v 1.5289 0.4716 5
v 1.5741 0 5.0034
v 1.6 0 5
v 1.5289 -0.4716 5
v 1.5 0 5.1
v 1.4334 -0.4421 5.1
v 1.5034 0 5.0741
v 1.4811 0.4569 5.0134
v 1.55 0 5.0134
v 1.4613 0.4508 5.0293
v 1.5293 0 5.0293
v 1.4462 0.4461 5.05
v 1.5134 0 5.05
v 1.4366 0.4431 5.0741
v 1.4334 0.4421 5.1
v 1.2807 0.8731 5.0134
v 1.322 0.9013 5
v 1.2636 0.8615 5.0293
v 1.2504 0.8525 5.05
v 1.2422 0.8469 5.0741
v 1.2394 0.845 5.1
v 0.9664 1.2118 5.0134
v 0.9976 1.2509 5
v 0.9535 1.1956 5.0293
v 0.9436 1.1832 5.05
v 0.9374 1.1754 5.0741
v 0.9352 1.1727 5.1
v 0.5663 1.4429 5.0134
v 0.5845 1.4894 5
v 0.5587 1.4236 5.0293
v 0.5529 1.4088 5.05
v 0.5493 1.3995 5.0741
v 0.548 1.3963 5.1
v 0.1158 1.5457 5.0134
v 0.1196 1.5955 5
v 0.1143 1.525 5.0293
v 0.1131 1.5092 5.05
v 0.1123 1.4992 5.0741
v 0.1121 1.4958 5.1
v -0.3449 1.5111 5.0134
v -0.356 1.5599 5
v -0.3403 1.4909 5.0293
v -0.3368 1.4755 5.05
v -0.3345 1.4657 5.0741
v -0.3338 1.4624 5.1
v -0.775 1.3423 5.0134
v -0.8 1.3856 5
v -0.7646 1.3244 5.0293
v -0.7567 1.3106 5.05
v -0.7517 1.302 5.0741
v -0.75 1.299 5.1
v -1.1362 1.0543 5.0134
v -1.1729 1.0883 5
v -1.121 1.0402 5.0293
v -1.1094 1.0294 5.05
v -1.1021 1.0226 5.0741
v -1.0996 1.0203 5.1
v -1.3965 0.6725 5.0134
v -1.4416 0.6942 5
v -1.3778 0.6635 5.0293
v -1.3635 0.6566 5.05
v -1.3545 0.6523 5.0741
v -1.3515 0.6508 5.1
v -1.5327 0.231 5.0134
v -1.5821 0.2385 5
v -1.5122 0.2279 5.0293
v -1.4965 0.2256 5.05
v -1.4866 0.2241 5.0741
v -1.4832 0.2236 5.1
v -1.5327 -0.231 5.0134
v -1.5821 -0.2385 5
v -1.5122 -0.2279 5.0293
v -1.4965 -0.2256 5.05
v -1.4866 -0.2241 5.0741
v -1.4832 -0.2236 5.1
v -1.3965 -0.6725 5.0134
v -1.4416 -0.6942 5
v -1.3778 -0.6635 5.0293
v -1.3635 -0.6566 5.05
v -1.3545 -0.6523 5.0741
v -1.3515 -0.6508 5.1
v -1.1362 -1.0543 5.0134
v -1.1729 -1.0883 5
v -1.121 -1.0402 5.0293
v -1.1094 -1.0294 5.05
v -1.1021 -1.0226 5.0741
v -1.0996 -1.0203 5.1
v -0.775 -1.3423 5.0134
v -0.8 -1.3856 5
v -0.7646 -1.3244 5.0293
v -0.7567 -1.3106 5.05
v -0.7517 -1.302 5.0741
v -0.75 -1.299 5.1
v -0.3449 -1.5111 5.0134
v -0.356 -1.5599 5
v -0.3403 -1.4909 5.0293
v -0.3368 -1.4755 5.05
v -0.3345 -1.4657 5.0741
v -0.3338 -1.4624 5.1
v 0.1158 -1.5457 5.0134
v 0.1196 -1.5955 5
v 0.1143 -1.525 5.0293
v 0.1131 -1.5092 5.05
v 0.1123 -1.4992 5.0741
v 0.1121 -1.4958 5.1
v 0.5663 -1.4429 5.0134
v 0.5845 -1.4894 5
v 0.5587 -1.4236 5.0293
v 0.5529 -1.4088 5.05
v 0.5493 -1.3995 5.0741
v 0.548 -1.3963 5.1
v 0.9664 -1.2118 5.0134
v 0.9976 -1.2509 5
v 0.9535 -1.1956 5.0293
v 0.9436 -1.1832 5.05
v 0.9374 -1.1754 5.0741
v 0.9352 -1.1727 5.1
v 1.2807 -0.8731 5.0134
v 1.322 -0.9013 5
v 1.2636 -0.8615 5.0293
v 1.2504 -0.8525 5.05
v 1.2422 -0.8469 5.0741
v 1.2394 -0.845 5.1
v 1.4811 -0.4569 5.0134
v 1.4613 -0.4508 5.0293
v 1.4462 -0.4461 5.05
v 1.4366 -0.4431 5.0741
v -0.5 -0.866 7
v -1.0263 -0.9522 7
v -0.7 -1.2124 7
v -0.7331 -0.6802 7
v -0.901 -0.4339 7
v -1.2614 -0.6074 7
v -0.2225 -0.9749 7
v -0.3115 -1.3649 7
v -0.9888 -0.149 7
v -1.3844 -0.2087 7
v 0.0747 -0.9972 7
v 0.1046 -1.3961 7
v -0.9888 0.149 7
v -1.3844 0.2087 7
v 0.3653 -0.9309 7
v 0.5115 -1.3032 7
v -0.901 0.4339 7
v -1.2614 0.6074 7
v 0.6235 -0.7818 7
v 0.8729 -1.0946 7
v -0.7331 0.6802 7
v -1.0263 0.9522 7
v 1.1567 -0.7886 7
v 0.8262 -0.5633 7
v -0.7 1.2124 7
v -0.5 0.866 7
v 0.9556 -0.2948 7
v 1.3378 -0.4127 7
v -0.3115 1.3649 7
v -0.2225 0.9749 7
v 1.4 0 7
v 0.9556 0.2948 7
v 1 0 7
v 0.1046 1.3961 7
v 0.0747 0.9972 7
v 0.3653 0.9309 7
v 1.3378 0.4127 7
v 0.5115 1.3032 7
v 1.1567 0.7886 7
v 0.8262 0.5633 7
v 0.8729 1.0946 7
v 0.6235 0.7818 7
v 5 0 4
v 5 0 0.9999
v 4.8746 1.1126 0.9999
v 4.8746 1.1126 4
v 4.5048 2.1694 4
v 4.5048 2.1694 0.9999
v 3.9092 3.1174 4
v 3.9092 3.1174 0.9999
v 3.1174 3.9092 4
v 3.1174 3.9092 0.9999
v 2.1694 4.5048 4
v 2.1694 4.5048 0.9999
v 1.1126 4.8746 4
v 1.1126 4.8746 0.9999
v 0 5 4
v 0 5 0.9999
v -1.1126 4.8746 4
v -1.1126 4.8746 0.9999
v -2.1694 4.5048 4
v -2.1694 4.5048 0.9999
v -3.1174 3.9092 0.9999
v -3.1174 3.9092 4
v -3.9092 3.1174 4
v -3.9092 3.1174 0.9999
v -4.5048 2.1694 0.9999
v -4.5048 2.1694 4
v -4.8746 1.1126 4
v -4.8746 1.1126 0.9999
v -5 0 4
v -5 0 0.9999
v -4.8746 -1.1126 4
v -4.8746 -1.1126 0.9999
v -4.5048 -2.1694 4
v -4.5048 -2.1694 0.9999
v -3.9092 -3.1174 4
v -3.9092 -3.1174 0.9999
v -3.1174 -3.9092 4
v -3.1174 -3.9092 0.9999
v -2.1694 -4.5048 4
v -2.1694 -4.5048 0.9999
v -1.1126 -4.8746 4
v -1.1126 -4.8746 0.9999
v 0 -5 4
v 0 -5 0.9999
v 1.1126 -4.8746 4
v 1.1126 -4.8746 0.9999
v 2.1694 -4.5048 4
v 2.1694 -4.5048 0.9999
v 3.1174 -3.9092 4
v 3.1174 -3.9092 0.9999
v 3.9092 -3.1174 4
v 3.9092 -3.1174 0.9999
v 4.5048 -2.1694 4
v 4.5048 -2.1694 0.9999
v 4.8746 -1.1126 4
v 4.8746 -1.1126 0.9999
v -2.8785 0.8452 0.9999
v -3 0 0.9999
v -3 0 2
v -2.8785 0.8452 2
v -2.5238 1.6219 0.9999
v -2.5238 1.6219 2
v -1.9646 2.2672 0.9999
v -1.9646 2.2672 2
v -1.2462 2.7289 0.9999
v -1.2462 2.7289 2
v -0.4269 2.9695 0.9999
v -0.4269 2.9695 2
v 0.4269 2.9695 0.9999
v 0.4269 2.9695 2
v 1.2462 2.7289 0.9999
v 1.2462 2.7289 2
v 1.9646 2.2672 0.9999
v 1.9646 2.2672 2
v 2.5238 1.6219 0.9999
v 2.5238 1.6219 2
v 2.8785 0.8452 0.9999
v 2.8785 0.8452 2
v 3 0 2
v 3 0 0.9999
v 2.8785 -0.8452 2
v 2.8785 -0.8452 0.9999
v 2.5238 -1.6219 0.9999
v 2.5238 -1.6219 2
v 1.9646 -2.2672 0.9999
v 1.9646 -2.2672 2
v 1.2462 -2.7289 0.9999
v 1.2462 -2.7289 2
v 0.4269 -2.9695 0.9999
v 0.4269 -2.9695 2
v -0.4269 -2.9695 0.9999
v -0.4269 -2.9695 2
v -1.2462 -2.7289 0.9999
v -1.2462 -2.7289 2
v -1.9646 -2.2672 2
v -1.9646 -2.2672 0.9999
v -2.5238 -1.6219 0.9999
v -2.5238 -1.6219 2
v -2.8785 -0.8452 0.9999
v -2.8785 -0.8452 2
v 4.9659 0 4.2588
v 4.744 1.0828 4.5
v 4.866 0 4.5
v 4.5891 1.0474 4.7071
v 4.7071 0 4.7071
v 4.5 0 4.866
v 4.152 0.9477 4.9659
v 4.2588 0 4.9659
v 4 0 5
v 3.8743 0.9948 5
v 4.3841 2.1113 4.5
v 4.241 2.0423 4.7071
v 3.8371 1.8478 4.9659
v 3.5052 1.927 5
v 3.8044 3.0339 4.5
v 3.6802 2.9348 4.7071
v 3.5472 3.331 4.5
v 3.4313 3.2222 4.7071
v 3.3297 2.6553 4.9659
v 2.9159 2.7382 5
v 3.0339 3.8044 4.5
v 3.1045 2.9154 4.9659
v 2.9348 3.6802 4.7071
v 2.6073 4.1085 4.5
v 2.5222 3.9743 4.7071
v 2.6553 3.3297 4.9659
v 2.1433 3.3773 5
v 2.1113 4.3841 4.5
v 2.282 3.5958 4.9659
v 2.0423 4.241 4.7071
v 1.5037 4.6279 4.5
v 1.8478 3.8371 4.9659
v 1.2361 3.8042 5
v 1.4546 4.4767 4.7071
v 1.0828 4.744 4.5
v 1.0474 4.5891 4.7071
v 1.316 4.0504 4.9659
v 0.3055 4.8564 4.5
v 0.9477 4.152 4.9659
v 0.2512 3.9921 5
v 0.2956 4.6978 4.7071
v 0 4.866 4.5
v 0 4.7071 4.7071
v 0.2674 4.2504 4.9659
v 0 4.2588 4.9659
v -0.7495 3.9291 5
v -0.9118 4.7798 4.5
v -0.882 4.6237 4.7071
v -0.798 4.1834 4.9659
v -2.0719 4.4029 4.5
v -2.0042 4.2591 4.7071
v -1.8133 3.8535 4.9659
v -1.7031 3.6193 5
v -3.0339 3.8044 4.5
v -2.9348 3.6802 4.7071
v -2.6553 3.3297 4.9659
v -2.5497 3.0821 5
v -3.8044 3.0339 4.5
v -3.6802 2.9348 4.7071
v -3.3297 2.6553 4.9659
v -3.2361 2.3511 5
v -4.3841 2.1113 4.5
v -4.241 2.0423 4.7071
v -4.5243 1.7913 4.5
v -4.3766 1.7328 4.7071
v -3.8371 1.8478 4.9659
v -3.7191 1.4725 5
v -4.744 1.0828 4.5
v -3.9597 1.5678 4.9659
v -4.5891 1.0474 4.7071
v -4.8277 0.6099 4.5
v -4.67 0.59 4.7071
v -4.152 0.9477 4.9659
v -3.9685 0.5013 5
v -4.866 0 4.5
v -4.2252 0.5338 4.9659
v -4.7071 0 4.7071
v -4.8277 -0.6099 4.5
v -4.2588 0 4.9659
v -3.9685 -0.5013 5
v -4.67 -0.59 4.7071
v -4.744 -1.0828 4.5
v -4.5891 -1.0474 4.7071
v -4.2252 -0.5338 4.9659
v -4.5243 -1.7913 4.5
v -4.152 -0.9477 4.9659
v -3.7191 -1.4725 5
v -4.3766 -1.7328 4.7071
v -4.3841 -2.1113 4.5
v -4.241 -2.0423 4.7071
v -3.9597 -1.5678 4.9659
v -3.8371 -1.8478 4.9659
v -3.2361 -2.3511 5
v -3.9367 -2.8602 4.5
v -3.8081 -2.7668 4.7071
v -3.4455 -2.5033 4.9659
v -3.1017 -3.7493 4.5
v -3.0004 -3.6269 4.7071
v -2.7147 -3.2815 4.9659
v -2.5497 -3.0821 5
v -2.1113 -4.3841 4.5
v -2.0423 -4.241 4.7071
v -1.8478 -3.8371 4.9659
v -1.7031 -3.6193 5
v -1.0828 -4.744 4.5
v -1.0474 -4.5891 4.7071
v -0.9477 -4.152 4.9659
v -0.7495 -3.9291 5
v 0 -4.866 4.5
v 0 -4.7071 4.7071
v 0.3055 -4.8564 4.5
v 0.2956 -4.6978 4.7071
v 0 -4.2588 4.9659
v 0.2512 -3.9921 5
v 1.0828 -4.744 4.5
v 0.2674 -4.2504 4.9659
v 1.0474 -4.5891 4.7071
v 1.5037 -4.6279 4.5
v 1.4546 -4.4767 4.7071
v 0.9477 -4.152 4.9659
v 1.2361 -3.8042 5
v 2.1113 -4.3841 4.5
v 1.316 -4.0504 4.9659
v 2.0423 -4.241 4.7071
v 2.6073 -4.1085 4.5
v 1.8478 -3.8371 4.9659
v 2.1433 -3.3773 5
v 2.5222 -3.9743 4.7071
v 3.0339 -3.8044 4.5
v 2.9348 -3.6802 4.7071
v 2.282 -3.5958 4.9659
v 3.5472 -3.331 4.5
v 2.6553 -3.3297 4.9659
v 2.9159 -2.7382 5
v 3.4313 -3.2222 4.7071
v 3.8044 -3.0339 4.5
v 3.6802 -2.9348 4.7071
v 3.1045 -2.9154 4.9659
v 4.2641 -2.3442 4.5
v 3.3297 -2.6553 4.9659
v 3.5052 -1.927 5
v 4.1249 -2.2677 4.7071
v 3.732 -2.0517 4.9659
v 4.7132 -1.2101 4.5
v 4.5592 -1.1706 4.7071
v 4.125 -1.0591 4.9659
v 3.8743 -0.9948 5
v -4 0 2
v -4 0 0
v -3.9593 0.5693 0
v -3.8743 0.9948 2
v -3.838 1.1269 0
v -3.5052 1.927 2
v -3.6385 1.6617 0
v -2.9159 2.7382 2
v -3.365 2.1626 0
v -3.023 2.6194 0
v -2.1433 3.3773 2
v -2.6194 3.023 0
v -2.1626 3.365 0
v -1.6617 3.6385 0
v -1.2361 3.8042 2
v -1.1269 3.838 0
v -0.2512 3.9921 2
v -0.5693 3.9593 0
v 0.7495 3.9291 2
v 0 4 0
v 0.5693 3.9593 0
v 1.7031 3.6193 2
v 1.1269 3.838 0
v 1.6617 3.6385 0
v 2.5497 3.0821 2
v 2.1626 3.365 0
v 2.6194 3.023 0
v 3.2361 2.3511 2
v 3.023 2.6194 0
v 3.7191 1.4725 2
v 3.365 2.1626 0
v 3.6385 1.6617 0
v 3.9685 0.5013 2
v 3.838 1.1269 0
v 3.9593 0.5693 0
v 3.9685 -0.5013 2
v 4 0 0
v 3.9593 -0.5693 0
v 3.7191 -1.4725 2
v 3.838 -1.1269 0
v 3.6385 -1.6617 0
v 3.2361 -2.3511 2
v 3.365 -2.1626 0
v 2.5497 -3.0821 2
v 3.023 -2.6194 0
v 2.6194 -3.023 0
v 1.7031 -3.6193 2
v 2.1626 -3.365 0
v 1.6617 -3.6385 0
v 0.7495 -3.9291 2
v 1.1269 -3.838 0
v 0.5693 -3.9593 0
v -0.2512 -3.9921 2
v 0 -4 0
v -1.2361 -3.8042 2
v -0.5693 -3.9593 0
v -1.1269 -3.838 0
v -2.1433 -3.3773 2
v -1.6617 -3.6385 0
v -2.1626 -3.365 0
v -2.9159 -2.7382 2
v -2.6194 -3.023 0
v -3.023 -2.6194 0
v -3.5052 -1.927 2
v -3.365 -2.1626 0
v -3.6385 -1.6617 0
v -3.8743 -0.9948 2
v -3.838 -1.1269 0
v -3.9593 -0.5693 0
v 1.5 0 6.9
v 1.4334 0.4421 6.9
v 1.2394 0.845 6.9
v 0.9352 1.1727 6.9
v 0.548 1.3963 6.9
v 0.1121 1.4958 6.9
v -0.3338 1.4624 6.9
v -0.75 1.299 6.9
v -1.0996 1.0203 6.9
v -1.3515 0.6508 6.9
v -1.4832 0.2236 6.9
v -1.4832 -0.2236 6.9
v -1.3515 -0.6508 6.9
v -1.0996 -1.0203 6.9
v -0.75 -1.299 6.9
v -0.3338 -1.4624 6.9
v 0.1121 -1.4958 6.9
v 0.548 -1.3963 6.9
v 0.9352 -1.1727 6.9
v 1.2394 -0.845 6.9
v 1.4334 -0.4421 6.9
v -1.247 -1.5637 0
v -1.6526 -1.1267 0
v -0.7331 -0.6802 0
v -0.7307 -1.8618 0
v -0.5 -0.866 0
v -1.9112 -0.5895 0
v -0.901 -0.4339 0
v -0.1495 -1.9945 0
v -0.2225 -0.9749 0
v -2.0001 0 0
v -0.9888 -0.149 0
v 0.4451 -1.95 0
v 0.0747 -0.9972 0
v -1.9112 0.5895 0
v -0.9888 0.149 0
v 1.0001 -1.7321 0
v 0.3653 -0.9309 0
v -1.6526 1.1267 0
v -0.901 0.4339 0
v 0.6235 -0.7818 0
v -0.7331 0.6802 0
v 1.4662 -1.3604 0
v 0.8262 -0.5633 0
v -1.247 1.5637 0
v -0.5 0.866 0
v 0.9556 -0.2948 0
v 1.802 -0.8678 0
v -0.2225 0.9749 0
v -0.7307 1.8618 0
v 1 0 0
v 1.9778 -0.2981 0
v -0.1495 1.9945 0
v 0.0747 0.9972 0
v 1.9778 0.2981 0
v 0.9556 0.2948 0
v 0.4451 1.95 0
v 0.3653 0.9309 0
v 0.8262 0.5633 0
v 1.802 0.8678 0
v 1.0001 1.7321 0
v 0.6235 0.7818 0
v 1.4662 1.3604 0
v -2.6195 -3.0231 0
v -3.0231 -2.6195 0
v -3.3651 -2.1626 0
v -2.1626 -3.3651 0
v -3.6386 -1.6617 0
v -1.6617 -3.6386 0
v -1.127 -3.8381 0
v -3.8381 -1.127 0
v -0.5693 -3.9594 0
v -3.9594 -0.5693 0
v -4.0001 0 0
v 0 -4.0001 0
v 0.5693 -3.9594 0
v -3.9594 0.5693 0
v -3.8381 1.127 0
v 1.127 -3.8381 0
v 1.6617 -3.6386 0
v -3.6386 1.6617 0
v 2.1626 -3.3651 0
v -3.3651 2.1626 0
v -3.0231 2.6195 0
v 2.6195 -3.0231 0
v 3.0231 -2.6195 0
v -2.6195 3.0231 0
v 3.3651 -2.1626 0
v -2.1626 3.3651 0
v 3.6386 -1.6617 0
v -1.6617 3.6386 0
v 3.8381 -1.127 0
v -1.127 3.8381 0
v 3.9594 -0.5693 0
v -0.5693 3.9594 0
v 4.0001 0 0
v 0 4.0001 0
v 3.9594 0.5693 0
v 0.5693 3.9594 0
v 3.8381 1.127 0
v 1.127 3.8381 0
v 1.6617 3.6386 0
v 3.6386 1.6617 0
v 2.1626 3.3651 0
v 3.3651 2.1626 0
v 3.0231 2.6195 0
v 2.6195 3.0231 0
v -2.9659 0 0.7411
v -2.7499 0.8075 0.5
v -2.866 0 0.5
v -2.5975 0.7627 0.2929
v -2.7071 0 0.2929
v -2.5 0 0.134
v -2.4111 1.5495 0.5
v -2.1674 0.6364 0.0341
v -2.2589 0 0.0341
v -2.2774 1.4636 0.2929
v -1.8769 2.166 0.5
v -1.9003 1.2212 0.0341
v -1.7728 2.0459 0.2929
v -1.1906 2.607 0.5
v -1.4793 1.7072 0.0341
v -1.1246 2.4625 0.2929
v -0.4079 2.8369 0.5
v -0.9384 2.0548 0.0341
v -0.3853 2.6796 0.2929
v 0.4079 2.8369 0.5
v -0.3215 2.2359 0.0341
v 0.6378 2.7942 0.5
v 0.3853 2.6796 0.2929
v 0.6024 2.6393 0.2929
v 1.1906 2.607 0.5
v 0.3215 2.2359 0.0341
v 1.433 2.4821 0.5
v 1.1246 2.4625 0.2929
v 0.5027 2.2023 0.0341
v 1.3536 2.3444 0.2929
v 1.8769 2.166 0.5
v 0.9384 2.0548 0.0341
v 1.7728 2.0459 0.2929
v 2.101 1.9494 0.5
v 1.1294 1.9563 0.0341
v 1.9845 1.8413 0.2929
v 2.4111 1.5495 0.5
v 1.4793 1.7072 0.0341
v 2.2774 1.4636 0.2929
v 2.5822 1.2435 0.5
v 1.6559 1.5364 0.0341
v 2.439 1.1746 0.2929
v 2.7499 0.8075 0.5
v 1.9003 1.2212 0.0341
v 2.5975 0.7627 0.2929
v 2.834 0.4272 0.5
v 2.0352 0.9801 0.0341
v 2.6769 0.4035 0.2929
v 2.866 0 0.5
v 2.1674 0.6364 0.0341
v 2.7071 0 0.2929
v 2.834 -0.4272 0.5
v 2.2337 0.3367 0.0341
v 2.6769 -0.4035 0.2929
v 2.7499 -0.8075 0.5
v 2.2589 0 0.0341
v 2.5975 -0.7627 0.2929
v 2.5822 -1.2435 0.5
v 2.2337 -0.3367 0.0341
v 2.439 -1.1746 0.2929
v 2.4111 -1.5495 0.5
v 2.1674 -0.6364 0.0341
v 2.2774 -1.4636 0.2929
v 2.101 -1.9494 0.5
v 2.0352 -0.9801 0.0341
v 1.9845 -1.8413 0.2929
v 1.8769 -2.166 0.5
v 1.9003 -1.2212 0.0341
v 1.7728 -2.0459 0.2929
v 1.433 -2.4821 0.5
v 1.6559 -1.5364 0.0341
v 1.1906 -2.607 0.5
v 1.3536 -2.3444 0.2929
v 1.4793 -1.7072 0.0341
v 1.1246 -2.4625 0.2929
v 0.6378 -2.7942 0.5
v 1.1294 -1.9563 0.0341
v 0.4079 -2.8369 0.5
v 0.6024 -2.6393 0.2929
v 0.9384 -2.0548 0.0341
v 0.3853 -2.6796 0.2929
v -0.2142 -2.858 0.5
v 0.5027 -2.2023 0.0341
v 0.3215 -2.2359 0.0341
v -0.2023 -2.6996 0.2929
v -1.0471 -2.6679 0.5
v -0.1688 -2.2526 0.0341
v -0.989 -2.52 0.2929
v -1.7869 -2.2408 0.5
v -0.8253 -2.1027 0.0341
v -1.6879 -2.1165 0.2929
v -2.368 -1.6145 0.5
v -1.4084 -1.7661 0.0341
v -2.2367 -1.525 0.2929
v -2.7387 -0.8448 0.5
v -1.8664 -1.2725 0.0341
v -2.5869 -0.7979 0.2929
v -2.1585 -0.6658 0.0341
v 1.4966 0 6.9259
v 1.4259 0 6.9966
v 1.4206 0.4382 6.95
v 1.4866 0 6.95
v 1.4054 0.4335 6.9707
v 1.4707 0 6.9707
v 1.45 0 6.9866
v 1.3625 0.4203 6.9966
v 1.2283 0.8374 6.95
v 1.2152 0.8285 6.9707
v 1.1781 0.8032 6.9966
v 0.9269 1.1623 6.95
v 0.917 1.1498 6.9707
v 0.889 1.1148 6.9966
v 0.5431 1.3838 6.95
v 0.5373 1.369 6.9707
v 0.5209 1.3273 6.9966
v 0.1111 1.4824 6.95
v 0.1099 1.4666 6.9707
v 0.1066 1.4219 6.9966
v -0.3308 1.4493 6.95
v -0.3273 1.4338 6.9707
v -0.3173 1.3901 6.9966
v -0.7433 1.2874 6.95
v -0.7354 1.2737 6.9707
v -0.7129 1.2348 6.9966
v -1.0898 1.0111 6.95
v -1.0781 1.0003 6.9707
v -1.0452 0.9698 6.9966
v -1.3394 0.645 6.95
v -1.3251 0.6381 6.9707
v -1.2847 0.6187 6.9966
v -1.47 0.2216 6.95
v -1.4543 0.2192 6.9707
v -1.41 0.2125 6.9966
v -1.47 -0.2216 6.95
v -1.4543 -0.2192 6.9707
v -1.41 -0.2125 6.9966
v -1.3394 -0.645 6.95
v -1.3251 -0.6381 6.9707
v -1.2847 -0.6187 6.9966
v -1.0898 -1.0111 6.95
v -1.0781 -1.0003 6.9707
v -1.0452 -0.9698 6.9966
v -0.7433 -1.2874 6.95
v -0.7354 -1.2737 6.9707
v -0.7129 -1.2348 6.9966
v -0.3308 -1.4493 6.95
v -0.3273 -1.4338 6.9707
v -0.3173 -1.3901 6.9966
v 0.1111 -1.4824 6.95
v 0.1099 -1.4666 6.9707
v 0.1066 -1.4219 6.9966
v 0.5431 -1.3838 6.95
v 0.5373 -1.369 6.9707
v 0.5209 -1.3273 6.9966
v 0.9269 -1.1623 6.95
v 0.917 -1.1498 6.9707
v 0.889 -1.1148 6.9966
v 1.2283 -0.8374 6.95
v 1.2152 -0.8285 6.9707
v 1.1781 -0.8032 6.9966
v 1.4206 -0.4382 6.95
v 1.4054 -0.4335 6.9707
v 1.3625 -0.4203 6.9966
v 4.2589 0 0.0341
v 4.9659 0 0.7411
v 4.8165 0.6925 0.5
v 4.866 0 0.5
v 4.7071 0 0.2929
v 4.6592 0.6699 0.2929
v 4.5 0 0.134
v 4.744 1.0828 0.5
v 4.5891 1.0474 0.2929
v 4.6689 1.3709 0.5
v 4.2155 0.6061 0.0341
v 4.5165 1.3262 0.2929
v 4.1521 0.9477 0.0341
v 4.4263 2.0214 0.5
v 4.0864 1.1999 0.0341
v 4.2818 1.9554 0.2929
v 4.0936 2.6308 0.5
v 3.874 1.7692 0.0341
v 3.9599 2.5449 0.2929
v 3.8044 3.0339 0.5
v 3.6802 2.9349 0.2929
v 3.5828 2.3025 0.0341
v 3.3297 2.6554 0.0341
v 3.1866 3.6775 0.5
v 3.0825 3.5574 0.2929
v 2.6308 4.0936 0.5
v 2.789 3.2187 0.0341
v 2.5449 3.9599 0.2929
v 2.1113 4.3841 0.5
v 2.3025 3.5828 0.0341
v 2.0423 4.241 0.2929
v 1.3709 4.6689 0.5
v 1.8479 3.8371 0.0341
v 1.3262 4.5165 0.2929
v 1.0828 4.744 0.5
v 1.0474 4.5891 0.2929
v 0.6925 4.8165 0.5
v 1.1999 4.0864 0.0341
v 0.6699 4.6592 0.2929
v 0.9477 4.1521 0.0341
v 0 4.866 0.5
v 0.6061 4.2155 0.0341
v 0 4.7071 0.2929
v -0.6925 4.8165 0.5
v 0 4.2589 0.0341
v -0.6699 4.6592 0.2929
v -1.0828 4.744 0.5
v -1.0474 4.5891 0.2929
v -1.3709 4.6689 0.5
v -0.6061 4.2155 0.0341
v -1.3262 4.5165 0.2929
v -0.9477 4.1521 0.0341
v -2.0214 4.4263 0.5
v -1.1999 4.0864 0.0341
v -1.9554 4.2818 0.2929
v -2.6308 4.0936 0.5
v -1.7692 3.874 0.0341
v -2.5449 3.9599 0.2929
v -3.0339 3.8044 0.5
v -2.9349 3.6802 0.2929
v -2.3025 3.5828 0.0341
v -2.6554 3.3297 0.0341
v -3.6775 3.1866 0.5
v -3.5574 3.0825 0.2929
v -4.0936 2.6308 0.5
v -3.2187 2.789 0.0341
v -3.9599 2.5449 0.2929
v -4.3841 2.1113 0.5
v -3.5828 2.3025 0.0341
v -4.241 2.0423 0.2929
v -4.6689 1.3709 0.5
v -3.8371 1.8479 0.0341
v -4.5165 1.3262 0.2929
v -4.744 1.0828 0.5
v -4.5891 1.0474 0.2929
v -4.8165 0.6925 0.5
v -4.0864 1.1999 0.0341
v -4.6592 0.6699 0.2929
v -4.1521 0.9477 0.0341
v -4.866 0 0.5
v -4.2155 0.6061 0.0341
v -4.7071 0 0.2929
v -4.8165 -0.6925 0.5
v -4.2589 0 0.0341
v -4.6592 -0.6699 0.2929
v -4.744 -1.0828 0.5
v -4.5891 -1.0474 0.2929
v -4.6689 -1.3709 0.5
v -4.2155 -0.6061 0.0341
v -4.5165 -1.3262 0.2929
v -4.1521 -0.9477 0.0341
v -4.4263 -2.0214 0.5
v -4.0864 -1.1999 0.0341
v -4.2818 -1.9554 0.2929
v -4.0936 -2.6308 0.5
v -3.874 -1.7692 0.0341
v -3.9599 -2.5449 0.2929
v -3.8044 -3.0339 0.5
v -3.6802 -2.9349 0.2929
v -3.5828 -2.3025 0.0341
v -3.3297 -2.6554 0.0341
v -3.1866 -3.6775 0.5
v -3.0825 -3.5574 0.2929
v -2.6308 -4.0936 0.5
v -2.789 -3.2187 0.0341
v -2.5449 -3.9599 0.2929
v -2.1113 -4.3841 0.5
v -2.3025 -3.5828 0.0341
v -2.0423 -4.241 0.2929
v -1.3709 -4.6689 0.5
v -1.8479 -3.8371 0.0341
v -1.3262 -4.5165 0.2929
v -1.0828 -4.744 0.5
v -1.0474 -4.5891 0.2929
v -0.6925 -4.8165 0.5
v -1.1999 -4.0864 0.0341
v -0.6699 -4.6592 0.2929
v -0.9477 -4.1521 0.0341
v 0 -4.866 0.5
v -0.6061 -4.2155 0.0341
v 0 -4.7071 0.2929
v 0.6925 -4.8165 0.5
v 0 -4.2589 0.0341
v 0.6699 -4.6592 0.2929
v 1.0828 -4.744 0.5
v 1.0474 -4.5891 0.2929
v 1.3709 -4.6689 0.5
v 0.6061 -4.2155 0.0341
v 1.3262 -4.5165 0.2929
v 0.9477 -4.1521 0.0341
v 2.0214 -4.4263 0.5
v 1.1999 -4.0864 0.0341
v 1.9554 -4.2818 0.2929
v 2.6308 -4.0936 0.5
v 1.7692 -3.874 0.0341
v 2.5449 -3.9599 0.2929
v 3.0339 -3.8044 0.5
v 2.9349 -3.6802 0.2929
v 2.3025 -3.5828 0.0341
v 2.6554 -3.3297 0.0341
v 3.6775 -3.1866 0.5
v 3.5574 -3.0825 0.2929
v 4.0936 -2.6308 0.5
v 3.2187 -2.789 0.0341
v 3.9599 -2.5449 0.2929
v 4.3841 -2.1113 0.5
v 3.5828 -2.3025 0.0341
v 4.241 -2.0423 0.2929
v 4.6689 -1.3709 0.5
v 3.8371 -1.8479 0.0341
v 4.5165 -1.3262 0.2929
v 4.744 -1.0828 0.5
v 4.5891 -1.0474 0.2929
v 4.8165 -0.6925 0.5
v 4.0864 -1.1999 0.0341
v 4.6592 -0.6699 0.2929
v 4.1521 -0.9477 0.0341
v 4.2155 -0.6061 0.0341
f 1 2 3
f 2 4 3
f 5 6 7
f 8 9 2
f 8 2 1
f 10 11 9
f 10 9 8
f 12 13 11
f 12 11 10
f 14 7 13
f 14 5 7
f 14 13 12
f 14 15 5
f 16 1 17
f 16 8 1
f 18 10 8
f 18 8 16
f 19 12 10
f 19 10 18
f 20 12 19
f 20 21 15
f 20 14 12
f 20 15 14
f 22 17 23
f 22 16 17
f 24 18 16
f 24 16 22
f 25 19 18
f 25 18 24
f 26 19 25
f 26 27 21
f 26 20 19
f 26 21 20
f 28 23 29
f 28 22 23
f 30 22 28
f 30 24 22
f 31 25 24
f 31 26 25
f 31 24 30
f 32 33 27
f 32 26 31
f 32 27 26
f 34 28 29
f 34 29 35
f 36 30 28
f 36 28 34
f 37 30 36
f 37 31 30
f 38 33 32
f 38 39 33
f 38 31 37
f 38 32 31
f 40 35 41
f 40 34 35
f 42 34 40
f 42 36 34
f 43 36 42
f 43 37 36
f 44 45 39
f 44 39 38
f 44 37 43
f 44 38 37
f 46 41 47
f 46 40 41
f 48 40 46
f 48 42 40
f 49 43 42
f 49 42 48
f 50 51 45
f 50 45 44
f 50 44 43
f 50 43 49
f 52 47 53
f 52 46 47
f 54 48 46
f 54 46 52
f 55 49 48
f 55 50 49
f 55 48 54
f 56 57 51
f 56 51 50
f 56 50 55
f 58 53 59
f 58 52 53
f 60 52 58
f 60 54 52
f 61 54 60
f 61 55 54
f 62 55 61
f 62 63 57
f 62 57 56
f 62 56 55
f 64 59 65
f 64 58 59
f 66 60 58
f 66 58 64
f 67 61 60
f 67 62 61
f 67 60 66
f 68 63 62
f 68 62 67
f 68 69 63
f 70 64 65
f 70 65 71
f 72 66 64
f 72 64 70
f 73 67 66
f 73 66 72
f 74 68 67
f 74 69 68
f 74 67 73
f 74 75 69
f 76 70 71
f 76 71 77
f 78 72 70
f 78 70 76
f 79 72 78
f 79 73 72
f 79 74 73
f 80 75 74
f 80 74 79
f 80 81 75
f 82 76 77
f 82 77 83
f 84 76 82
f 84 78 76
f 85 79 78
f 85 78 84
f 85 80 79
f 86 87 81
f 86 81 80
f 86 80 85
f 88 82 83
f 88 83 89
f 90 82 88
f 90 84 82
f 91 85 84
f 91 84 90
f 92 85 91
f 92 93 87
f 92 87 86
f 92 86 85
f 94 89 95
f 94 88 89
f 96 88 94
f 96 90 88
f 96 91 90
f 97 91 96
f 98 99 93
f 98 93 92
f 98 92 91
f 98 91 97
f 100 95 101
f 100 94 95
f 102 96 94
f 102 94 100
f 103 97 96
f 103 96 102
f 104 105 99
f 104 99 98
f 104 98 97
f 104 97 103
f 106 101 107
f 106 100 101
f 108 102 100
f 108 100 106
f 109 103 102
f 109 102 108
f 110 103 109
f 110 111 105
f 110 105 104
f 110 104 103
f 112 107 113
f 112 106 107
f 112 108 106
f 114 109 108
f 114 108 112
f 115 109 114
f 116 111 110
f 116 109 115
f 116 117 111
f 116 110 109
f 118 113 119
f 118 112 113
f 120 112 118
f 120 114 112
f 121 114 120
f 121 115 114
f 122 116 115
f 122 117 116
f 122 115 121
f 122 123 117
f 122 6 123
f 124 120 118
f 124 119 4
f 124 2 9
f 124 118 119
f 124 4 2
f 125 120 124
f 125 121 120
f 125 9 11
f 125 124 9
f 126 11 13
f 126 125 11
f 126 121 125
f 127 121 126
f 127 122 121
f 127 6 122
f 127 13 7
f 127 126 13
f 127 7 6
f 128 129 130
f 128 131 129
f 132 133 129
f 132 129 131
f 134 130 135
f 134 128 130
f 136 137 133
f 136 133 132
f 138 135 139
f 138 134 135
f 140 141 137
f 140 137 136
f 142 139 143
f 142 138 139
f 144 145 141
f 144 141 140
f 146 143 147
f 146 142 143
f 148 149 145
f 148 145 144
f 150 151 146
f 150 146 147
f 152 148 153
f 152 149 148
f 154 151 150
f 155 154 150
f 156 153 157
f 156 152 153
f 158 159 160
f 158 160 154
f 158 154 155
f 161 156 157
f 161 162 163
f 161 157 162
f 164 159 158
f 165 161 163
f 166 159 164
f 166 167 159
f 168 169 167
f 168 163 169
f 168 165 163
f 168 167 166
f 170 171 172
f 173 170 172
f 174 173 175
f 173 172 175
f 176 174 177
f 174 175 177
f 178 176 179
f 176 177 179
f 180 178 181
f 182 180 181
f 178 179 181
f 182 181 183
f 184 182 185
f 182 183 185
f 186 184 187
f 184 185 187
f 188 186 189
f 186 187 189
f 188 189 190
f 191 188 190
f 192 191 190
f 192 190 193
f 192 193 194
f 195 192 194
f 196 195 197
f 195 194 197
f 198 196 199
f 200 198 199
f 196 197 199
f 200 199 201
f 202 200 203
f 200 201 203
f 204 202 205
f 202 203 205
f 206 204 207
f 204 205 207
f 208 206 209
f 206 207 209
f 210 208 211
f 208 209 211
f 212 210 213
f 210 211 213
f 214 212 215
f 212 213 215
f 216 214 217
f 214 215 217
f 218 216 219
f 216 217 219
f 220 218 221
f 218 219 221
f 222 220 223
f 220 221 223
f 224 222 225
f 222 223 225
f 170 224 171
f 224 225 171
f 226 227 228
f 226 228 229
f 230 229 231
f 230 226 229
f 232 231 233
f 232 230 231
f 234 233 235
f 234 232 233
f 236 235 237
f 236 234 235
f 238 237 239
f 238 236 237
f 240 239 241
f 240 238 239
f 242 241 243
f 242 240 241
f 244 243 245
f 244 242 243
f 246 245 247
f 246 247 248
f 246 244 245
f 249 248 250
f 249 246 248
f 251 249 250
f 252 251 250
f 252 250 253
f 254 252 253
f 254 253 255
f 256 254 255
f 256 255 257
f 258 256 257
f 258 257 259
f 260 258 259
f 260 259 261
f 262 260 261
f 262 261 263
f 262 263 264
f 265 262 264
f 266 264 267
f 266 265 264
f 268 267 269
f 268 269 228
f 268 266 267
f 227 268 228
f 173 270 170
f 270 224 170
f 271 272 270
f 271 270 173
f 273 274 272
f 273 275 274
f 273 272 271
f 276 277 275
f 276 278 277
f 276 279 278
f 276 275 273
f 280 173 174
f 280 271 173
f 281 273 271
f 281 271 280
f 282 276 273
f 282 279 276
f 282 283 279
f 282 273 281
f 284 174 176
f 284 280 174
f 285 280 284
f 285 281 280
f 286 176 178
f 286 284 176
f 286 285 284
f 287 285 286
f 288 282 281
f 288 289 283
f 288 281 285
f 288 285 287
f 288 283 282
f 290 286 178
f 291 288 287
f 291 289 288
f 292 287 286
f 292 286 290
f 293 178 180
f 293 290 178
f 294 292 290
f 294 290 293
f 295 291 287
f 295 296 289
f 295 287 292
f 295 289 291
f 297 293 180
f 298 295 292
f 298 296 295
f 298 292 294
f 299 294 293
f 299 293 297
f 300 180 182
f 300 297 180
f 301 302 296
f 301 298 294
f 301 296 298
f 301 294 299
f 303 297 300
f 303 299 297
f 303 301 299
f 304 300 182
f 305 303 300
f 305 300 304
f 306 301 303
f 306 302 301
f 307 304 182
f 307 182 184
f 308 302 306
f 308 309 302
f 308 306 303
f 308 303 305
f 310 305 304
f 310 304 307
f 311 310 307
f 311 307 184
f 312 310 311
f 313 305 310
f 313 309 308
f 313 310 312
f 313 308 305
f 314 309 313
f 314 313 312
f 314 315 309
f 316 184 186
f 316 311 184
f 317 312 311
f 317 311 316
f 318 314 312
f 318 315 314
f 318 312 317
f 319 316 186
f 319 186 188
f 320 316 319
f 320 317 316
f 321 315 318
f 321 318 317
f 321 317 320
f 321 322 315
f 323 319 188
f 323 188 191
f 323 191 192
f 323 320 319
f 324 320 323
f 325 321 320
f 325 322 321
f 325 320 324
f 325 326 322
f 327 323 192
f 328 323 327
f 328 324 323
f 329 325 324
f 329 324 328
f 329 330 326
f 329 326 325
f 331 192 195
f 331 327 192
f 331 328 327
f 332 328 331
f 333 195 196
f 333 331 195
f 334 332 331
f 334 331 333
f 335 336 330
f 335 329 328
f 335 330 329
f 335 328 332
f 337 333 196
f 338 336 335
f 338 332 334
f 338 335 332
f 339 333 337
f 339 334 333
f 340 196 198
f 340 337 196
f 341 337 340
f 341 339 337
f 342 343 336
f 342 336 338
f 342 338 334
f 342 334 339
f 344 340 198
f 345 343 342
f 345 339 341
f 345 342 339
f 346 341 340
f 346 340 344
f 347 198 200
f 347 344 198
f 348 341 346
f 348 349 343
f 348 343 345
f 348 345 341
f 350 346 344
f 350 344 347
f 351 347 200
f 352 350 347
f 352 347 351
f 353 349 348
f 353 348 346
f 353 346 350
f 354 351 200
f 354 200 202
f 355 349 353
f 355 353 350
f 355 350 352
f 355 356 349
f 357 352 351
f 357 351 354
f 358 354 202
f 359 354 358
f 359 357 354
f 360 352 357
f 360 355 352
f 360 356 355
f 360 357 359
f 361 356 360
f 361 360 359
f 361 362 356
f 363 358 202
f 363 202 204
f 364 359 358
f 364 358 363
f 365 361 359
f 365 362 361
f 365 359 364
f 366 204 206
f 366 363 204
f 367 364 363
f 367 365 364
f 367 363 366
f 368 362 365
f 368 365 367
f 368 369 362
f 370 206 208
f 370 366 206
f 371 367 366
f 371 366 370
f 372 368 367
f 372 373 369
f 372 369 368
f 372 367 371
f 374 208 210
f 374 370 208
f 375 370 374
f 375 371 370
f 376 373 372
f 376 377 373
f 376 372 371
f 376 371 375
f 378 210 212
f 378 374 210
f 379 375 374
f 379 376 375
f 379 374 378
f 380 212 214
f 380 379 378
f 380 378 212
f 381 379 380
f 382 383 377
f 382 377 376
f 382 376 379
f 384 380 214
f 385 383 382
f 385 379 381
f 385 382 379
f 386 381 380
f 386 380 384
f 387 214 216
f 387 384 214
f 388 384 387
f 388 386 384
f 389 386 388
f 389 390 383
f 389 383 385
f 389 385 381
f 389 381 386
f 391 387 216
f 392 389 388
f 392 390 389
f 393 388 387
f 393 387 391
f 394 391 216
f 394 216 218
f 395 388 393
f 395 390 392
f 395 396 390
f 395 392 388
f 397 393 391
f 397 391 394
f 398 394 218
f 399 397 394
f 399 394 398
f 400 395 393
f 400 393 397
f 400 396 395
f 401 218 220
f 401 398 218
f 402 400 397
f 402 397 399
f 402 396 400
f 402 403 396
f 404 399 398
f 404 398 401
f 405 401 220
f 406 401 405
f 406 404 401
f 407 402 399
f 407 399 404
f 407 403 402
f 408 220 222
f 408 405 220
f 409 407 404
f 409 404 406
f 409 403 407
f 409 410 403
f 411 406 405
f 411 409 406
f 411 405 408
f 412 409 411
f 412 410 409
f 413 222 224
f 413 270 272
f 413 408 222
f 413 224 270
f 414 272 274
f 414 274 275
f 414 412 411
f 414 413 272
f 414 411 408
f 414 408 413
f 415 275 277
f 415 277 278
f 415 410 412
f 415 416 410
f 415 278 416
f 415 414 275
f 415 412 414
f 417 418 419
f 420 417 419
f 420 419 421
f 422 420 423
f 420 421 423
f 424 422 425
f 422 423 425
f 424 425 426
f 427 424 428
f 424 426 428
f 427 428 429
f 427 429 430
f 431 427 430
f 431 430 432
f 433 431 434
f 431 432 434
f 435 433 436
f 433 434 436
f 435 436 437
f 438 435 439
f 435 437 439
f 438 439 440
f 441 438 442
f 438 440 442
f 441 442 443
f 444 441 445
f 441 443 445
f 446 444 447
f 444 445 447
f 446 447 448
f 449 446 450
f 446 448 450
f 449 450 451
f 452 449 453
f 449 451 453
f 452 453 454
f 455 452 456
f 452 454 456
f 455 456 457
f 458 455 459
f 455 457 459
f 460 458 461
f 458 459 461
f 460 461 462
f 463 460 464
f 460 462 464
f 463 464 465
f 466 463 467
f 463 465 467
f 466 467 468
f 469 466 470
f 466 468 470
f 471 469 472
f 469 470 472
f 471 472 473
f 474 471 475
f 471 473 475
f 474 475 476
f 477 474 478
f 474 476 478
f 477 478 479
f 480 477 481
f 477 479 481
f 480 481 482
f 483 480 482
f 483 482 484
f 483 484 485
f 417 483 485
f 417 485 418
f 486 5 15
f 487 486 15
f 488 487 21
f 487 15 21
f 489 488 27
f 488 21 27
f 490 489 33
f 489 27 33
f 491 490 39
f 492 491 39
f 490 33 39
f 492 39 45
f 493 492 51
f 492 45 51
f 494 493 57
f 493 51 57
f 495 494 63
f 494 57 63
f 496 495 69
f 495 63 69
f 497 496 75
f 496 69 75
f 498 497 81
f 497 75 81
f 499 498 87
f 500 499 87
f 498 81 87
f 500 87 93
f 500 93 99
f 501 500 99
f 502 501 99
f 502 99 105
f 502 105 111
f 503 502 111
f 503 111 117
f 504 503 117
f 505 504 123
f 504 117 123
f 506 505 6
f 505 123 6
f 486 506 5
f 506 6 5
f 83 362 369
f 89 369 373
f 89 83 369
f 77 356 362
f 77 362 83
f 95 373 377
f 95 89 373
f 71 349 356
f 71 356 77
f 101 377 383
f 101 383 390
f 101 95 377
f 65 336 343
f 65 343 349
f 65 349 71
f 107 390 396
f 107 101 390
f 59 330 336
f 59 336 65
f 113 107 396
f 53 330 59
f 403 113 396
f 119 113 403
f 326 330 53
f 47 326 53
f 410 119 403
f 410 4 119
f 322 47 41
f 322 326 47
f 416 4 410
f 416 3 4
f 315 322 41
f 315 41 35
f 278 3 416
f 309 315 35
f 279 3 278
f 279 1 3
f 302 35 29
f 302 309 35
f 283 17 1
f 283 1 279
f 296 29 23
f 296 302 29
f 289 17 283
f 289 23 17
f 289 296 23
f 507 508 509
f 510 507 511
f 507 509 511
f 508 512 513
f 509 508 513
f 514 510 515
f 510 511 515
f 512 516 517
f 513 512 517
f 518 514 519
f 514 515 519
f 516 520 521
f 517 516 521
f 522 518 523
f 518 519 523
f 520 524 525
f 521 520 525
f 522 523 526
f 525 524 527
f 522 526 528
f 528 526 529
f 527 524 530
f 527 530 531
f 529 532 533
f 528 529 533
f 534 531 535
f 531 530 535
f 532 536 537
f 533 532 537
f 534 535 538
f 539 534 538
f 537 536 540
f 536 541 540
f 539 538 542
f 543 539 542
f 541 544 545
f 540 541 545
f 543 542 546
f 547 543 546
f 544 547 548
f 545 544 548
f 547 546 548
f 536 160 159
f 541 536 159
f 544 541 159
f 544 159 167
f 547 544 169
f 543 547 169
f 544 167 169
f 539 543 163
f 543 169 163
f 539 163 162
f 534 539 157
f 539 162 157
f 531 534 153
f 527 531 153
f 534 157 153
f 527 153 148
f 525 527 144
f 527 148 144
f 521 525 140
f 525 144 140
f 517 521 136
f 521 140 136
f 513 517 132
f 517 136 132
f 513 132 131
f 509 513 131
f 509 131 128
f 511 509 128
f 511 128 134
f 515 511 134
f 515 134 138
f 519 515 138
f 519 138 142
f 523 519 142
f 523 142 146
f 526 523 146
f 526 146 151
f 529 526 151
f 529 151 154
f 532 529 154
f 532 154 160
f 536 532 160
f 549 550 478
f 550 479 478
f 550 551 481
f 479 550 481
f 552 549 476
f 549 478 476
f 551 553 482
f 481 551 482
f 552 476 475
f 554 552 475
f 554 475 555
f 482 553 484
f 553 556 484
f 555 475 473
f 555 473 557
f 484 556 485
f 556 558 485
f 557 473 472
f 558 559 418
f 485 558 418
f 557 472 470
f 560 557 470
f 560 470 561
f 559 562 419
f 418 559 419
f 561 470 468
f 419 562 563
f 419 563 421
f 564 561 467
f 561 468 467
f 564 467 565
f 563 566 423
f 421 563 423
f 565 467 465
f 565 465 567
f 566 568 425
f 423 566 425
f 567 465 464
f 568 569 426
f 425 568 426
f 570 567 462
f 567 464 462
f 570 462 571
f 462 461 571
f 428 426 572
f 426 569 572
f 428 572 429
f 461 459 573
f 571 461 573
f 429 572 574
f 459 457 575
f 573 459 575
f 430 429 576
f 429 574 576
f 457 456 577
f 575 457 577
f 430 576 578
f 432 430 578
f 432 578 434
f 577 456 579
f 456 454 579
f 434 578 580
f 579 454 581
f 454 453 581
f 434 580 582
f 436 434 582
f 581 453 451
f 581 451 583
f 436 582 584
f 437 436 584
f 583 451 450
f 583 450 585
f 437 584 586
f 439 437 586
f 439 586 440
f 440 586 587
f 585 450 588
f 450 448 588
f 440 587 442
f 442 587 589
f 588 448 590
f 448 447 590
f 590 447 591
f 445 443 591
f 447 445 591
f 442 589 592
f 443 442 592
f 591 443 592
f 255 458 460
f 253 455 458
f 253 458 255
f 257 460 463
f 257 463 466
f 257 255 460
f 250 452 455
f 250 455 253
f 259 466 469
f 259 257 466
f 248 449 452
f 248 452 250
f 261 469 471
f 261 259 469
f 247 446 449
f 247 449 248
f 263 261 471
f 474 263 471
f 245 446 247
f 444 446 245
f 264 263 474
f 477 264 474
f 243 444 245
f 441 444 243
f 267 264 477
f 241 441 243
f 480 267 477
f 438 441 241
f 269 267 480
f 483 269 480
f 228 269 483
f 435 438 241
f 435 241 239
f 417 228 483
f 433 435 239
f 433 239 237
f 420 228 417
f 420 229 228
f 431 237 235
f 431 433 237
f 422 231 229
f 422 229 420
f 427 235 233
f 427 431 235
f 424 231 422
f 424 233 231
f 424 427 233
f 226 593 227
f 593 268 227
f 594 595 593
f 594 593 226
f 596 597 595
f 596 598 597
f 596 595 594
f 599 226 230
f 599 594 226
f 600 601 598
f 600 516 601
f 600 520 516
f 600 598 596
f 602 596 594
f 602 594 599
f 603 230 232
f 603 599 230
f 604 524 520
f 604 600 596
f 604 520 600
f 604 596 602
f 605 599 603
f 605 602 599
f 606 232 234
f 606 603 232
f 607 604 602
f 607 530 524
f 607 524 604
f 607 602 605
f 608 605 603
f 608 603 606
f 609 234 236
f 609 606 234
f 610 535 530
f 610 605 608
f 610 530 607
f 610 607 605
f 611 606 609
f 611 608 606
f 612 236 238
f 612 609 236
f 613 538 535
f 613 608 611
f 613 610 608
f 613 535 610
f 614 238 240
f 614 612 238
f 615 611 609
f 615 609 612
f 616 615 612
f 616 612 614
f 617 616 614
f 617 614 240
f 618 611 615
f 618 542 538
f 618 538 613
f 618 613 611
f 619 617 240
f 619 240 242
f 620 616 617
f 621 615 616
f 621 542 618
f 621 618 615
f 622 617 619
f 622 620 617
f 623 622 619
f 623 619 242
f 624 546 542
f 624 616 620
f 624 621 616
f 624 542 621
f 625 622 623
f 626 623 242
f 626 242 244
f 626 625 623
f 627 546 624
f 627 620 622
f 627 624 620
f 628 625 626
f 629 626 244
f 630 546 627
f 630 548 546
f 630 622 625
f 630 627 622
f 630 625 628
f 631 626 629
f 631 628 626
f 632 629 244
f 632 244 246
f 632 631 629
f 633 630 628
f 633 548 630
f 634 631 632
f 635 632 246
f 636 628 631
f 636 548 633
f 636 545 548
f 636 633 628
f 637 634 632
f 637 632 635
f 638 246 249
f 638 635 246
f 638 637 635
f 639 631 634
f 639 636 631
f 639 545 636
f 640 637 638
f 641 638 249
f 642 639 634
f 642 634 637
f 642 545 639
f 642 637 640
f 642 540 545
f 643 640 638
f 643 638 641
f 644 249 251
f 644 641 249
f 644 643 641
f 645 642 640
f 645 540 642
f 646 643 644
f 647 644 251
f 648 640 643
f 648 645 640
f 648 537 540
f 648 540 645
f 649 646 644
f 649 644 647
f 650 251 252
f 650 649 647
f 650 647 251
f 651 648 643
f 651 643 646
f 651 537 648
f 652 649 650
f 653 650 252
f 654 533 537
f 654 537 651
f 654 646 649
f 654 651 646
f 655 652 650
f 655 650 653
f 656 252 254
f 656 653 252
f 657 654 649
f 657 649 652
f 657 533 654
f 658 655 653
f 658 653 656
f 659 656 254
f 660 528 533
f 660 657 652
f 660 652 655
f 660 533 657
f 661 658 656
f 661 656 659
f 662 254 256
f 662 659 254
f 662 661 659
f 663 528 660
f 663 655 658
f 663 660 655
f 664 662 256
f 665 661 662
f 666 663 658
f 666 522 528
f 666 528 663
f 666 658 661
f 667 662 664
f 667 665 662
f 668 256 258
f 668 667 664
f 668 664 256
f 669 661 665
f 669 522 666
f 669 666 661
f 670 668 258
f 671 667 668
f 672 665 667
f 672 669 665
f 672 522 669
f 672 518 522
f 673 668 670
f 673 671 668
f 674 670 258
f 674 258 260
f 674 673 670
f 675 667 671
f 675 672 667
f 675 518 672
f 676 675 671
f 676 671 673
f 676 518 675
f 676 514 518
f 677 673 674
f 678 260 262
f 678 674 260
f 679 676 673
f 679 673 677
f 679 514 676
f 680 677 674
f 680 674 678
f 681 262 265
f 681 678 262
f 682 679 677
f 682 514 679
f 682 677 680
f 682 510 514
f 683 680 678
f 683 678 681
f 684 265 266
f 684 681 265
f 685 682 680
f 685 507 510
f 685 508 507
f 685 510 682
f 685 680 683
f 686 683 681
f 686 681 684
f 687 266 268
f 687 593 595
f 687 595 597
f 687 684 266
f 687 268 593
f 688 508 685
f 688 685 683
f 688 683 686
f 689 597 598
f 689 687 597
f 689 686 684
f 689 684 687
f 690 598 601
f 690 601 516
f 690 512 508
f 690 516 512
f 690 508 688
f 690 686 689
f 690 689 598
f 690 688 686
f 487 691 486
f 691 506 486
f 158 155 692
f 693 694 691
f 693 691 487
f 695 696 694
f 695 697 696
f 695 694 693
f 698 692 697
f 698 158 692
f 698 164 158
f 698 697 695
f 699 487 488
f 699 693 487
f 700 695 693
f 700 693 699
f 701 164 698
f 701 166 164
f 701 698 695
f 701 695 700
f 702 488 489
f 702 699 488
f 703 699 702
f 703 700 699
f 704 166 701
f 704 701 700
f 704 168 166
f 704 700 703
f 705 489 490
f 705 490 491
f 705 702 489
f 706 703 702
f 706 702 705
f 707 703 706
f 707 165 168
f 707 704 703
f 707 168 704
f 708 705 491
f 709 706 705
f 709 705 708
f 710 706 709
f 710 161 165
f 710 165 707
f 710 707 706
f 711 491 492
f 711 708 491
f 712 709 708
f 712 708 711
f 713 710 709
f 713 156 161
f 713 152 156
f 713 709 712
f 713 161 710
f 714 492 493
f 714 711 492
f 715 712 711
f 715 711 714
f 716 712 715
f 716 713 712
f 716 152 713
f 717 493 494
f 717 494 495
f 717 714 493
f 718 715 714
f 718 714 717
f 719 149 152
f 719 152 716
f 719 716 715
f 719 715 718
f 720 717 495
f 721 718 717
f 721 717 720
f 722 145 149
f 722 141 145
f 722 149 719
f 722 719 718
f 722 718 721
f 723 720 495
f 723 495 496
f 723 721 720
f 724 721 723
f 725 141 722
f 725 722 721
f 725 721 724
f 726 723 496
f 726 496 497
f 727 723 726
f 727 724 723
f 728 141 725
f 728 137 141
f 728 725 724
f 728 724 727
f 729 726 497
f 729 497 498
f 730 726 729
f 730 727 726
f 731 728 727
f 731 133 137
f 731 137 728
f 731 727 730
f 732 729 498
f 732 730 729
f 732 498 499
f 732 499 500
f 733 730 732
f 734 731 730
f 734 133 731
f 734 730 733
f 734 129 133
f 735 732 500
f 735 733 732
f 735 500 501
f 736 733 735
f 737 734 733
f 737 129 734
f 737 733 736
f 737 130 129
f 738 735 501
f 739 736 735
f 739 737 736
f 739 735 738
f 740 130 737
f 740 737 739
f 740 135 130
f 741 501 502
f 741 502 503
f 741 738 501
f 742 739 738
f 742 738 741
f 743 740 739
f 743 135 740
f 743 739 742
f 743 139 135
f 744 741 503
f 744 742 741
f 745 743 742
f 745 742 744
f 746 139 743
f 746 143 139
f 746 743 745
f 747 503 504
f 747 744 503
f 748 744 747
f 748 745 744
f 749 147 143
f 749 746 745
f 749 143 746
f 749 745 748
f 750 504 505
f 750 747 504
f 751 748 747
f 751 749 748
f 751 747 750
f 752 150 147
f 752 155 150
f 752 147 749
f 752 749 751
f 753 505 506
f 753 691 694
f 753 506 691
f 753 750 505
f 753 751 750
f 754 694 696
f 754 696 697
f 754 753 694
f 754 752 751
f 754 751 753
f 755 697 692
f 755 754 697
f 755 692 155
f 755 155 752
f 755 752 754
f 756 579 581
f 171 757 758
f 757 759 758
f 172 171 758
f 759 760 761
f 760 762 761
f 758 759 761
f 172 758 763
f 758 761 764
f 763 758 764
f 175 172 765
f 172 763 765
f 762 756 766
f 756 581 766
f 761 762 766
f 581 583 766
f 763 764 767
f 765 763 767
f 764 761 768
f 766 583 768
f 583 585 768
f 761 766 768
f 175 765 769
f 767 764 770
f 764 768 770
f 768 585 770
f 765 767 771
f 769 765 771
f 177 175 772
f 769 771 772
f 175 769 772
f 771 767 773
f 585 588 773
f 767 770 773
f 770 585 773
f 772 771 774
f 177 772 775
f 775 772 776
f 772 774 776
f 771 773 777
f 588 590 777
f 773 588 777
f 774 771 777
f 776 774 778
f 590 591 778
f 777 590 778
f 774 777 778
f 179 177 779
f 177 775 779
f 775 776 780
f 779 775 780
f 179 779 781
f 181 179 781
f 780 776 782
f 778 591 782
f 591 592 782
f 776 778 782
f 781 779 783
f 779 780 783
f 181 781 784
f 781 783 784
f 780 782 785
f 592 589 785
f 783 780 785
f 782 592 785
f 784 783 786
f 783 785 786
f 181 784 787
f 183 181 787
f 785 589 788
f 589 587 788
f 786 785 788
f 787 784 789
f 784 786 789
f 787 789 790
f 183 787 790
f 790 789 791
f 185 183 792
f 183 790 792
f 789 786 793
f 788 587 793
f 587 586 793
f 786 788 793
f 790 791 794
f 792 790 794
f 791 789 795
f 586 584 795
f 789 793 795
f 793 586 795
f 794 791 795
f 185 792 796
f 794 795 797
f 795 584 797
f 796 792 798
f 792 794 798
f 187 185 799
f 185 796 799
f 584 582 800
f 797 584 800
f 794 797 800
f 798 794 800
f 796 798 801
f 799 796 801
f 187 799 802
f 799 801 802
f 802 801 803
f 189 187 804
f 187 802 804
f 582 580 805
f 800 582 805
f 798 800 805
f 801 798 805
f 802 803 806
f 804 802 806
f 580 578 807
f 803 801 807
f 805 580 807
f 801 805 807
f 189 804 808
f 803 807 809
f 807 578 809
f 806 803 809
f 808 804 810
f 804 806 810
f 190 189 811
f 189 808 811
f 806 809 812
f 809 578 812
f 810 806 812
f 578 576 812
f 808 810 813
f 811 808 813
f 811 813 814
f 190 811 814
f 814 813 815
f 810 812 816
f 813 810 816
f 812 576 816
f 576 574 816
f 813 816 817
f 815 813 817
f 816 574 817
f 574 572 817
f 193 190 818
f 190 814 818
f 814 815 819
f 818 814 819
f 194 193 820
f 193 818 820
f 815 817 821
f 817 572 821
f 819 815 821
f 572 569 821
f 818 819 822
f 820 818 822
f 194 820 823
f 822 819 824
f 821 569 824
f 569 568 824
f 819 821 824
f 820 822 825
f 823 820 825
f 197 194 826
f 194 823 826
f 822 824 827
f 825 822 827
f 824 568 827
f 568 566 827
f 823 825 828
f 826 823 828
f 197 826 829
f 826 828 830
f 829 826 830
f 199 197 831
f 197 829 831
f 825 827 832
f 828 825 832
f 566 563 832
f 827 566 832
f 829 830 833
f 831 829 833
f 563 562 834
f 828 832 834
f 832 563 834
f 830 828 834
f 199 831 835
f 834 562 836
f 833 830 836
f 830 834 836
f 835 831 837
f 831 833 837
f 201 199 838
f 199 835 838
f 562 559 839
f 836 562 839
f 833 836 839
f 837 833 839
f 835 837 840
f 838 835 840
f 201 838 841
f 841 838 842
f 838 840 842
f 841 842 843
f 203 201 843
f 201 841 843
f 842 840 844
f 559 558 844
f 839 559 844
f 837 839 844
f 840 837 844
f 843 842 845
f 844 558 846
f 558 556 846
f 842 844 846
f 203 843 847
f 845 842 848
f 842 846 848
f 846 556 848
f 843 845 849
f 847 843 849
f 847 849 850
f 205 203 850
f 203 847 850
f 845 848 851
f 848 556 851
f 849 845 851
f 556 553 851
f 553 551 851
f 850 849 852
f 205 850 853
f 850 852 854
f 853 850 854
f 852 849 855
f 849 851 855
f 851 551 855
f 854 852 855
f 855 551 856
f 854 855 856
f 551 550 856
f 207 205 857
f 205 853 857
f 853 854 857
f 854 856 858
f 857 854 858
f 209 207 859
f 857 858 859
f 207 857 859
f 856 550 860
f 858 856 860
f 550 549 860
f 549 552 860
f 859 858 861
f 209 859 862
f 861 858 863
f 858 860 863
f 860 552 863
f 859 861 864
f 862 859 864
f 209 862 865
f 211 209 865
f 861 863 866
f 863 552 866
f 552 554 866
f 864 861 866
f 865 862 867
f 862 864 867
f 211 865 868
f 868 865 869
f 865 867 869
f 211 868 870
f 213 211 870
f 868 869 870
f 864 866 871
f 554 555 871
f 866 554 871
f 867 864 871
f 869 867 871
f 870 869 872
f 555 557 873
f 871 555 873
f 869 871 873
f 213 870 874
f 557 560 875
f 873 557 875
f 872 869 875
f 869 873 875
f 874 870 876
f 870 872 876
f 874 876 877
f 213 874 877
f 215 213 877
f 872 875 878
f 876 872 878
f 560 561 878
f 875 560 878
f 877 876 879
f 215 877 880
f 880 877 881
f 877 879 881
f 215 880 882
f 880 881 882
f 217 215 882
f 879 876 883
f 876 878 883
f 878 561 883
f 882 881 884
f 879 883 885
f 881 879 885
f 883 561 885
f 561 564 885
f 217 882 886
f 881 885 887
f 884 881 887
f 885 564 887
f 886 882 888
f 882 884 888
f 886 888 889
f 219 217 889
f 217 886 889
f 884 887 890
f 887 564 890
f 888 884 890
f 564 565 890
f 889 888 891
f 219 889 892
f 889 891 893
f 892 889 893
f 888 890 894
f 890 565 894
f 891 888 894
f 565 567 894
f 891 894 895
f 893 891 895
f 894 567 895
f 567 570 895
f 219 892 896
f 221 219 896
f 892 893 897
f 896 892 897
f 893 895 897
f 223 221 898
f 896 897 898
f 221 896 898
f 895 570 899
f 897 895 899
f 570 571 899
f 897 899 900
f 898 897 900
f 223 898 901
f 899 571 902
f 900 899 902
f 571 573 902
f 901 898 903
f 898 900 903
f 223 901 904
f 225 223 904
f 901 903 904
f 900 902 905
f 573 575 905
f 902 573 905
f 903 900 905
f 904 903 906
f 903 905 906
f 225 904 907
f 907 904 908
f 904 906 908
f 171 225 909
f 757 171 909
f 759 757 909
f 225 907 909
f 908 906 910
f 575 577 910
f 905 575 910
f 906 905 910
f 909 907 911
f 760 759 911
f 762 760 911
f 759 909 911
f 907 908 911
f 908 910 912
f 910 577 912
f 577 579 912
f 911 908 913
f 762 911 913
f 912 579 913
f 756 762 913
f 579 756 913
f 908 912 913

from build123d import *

# Parameters (mm, degrees)
ESQUISSE1_R             = 5
BOSS_EXTRU_1_DEPTH      = 5
ESQUISSE2_R             = 1.5
BOSS_EXTRU_2_DEPTH      = 2
ESQUISSE3_R             = 1
ENL_V_MAT_EXTRU_1_DEPTH = 10.949874371
ESQUISSE4_R             = 4
ESQUISSE4_R_2           = 3
ENL_V_MAT_EXTRU_2_DEPTH = 2
CONG_1_R                = 1
CONG_2_R                = 1
CONG_3_R                = 0.1


with BuildPart() as part:
    # Esquisse1 → Boss.-Extru.1 (new body)
    with BuildSketch(Plane.XY):
        Circle(ESQUISSE1_R)
    extrude(amount=BOSS_EXTRU_1_DEPTH)

    # Esquisse2 → Boss.-Extru.2 (add)
    with BuildSketch(Plane.XY.offset(5)):
        Circle(ESQUISSE2_R)
    extrude(amount=BOSS_EXTRU_2_DEPTH)

    # Esquisse3 → Enlèv. mat.-Extru.1 (cut, through all)
    with BuildSketch(Plane.XY.offset(7)):
        Circle(ESQUISSE3_R)
    extrude(amount=-ENL_V_MAT_EXTRU_1_DEPTH, mode=Mode.SUBTRACT)

    # Esquisse4 → Enlèv. mat.-Extru.2 (cut)
    with BuildSketch(Plane(origin=(0, 0, 0), x_dir=(-1, 0, 0), z_dir=(0, 0, -1))):
        Circle(ESQUISSE4_R)
        Circle(ESQUISSE4_R_2, mode=Mode.SUBTRACT)
    extrude(amount=-ENL_V_MAT_EXTRU_2_DEPTH, mode=Mode.SUBTRACT)

    # Congé1
    cong_1_edges = [part.edges().sort_by_distance(p)[0] for p in [
        (3, 0, 0),
        (-5, 0, 0),
    ]]
    fillet(cong_1_edges, radius=CONG_1_R - 0.0001)  # a hair under: the kernel refuses the full size

    # Congé2
    cong_2_edges = [part.edges().sort_by_distance(p)[0] for p in [
        (-5, 0, 5),
    ]]
    fillet(cong_2_edges, radius=CONG_2_R)

    # Congé3
    cong_3_edges = [part.edges().sort_by_distance(p)[0] for p in [
        (-1.5, 0, 5),
        (-1.5, 0, 7),
    ]]
    fillet(cong_3_edges, radius=CONG_3_R)


solid = part.part
